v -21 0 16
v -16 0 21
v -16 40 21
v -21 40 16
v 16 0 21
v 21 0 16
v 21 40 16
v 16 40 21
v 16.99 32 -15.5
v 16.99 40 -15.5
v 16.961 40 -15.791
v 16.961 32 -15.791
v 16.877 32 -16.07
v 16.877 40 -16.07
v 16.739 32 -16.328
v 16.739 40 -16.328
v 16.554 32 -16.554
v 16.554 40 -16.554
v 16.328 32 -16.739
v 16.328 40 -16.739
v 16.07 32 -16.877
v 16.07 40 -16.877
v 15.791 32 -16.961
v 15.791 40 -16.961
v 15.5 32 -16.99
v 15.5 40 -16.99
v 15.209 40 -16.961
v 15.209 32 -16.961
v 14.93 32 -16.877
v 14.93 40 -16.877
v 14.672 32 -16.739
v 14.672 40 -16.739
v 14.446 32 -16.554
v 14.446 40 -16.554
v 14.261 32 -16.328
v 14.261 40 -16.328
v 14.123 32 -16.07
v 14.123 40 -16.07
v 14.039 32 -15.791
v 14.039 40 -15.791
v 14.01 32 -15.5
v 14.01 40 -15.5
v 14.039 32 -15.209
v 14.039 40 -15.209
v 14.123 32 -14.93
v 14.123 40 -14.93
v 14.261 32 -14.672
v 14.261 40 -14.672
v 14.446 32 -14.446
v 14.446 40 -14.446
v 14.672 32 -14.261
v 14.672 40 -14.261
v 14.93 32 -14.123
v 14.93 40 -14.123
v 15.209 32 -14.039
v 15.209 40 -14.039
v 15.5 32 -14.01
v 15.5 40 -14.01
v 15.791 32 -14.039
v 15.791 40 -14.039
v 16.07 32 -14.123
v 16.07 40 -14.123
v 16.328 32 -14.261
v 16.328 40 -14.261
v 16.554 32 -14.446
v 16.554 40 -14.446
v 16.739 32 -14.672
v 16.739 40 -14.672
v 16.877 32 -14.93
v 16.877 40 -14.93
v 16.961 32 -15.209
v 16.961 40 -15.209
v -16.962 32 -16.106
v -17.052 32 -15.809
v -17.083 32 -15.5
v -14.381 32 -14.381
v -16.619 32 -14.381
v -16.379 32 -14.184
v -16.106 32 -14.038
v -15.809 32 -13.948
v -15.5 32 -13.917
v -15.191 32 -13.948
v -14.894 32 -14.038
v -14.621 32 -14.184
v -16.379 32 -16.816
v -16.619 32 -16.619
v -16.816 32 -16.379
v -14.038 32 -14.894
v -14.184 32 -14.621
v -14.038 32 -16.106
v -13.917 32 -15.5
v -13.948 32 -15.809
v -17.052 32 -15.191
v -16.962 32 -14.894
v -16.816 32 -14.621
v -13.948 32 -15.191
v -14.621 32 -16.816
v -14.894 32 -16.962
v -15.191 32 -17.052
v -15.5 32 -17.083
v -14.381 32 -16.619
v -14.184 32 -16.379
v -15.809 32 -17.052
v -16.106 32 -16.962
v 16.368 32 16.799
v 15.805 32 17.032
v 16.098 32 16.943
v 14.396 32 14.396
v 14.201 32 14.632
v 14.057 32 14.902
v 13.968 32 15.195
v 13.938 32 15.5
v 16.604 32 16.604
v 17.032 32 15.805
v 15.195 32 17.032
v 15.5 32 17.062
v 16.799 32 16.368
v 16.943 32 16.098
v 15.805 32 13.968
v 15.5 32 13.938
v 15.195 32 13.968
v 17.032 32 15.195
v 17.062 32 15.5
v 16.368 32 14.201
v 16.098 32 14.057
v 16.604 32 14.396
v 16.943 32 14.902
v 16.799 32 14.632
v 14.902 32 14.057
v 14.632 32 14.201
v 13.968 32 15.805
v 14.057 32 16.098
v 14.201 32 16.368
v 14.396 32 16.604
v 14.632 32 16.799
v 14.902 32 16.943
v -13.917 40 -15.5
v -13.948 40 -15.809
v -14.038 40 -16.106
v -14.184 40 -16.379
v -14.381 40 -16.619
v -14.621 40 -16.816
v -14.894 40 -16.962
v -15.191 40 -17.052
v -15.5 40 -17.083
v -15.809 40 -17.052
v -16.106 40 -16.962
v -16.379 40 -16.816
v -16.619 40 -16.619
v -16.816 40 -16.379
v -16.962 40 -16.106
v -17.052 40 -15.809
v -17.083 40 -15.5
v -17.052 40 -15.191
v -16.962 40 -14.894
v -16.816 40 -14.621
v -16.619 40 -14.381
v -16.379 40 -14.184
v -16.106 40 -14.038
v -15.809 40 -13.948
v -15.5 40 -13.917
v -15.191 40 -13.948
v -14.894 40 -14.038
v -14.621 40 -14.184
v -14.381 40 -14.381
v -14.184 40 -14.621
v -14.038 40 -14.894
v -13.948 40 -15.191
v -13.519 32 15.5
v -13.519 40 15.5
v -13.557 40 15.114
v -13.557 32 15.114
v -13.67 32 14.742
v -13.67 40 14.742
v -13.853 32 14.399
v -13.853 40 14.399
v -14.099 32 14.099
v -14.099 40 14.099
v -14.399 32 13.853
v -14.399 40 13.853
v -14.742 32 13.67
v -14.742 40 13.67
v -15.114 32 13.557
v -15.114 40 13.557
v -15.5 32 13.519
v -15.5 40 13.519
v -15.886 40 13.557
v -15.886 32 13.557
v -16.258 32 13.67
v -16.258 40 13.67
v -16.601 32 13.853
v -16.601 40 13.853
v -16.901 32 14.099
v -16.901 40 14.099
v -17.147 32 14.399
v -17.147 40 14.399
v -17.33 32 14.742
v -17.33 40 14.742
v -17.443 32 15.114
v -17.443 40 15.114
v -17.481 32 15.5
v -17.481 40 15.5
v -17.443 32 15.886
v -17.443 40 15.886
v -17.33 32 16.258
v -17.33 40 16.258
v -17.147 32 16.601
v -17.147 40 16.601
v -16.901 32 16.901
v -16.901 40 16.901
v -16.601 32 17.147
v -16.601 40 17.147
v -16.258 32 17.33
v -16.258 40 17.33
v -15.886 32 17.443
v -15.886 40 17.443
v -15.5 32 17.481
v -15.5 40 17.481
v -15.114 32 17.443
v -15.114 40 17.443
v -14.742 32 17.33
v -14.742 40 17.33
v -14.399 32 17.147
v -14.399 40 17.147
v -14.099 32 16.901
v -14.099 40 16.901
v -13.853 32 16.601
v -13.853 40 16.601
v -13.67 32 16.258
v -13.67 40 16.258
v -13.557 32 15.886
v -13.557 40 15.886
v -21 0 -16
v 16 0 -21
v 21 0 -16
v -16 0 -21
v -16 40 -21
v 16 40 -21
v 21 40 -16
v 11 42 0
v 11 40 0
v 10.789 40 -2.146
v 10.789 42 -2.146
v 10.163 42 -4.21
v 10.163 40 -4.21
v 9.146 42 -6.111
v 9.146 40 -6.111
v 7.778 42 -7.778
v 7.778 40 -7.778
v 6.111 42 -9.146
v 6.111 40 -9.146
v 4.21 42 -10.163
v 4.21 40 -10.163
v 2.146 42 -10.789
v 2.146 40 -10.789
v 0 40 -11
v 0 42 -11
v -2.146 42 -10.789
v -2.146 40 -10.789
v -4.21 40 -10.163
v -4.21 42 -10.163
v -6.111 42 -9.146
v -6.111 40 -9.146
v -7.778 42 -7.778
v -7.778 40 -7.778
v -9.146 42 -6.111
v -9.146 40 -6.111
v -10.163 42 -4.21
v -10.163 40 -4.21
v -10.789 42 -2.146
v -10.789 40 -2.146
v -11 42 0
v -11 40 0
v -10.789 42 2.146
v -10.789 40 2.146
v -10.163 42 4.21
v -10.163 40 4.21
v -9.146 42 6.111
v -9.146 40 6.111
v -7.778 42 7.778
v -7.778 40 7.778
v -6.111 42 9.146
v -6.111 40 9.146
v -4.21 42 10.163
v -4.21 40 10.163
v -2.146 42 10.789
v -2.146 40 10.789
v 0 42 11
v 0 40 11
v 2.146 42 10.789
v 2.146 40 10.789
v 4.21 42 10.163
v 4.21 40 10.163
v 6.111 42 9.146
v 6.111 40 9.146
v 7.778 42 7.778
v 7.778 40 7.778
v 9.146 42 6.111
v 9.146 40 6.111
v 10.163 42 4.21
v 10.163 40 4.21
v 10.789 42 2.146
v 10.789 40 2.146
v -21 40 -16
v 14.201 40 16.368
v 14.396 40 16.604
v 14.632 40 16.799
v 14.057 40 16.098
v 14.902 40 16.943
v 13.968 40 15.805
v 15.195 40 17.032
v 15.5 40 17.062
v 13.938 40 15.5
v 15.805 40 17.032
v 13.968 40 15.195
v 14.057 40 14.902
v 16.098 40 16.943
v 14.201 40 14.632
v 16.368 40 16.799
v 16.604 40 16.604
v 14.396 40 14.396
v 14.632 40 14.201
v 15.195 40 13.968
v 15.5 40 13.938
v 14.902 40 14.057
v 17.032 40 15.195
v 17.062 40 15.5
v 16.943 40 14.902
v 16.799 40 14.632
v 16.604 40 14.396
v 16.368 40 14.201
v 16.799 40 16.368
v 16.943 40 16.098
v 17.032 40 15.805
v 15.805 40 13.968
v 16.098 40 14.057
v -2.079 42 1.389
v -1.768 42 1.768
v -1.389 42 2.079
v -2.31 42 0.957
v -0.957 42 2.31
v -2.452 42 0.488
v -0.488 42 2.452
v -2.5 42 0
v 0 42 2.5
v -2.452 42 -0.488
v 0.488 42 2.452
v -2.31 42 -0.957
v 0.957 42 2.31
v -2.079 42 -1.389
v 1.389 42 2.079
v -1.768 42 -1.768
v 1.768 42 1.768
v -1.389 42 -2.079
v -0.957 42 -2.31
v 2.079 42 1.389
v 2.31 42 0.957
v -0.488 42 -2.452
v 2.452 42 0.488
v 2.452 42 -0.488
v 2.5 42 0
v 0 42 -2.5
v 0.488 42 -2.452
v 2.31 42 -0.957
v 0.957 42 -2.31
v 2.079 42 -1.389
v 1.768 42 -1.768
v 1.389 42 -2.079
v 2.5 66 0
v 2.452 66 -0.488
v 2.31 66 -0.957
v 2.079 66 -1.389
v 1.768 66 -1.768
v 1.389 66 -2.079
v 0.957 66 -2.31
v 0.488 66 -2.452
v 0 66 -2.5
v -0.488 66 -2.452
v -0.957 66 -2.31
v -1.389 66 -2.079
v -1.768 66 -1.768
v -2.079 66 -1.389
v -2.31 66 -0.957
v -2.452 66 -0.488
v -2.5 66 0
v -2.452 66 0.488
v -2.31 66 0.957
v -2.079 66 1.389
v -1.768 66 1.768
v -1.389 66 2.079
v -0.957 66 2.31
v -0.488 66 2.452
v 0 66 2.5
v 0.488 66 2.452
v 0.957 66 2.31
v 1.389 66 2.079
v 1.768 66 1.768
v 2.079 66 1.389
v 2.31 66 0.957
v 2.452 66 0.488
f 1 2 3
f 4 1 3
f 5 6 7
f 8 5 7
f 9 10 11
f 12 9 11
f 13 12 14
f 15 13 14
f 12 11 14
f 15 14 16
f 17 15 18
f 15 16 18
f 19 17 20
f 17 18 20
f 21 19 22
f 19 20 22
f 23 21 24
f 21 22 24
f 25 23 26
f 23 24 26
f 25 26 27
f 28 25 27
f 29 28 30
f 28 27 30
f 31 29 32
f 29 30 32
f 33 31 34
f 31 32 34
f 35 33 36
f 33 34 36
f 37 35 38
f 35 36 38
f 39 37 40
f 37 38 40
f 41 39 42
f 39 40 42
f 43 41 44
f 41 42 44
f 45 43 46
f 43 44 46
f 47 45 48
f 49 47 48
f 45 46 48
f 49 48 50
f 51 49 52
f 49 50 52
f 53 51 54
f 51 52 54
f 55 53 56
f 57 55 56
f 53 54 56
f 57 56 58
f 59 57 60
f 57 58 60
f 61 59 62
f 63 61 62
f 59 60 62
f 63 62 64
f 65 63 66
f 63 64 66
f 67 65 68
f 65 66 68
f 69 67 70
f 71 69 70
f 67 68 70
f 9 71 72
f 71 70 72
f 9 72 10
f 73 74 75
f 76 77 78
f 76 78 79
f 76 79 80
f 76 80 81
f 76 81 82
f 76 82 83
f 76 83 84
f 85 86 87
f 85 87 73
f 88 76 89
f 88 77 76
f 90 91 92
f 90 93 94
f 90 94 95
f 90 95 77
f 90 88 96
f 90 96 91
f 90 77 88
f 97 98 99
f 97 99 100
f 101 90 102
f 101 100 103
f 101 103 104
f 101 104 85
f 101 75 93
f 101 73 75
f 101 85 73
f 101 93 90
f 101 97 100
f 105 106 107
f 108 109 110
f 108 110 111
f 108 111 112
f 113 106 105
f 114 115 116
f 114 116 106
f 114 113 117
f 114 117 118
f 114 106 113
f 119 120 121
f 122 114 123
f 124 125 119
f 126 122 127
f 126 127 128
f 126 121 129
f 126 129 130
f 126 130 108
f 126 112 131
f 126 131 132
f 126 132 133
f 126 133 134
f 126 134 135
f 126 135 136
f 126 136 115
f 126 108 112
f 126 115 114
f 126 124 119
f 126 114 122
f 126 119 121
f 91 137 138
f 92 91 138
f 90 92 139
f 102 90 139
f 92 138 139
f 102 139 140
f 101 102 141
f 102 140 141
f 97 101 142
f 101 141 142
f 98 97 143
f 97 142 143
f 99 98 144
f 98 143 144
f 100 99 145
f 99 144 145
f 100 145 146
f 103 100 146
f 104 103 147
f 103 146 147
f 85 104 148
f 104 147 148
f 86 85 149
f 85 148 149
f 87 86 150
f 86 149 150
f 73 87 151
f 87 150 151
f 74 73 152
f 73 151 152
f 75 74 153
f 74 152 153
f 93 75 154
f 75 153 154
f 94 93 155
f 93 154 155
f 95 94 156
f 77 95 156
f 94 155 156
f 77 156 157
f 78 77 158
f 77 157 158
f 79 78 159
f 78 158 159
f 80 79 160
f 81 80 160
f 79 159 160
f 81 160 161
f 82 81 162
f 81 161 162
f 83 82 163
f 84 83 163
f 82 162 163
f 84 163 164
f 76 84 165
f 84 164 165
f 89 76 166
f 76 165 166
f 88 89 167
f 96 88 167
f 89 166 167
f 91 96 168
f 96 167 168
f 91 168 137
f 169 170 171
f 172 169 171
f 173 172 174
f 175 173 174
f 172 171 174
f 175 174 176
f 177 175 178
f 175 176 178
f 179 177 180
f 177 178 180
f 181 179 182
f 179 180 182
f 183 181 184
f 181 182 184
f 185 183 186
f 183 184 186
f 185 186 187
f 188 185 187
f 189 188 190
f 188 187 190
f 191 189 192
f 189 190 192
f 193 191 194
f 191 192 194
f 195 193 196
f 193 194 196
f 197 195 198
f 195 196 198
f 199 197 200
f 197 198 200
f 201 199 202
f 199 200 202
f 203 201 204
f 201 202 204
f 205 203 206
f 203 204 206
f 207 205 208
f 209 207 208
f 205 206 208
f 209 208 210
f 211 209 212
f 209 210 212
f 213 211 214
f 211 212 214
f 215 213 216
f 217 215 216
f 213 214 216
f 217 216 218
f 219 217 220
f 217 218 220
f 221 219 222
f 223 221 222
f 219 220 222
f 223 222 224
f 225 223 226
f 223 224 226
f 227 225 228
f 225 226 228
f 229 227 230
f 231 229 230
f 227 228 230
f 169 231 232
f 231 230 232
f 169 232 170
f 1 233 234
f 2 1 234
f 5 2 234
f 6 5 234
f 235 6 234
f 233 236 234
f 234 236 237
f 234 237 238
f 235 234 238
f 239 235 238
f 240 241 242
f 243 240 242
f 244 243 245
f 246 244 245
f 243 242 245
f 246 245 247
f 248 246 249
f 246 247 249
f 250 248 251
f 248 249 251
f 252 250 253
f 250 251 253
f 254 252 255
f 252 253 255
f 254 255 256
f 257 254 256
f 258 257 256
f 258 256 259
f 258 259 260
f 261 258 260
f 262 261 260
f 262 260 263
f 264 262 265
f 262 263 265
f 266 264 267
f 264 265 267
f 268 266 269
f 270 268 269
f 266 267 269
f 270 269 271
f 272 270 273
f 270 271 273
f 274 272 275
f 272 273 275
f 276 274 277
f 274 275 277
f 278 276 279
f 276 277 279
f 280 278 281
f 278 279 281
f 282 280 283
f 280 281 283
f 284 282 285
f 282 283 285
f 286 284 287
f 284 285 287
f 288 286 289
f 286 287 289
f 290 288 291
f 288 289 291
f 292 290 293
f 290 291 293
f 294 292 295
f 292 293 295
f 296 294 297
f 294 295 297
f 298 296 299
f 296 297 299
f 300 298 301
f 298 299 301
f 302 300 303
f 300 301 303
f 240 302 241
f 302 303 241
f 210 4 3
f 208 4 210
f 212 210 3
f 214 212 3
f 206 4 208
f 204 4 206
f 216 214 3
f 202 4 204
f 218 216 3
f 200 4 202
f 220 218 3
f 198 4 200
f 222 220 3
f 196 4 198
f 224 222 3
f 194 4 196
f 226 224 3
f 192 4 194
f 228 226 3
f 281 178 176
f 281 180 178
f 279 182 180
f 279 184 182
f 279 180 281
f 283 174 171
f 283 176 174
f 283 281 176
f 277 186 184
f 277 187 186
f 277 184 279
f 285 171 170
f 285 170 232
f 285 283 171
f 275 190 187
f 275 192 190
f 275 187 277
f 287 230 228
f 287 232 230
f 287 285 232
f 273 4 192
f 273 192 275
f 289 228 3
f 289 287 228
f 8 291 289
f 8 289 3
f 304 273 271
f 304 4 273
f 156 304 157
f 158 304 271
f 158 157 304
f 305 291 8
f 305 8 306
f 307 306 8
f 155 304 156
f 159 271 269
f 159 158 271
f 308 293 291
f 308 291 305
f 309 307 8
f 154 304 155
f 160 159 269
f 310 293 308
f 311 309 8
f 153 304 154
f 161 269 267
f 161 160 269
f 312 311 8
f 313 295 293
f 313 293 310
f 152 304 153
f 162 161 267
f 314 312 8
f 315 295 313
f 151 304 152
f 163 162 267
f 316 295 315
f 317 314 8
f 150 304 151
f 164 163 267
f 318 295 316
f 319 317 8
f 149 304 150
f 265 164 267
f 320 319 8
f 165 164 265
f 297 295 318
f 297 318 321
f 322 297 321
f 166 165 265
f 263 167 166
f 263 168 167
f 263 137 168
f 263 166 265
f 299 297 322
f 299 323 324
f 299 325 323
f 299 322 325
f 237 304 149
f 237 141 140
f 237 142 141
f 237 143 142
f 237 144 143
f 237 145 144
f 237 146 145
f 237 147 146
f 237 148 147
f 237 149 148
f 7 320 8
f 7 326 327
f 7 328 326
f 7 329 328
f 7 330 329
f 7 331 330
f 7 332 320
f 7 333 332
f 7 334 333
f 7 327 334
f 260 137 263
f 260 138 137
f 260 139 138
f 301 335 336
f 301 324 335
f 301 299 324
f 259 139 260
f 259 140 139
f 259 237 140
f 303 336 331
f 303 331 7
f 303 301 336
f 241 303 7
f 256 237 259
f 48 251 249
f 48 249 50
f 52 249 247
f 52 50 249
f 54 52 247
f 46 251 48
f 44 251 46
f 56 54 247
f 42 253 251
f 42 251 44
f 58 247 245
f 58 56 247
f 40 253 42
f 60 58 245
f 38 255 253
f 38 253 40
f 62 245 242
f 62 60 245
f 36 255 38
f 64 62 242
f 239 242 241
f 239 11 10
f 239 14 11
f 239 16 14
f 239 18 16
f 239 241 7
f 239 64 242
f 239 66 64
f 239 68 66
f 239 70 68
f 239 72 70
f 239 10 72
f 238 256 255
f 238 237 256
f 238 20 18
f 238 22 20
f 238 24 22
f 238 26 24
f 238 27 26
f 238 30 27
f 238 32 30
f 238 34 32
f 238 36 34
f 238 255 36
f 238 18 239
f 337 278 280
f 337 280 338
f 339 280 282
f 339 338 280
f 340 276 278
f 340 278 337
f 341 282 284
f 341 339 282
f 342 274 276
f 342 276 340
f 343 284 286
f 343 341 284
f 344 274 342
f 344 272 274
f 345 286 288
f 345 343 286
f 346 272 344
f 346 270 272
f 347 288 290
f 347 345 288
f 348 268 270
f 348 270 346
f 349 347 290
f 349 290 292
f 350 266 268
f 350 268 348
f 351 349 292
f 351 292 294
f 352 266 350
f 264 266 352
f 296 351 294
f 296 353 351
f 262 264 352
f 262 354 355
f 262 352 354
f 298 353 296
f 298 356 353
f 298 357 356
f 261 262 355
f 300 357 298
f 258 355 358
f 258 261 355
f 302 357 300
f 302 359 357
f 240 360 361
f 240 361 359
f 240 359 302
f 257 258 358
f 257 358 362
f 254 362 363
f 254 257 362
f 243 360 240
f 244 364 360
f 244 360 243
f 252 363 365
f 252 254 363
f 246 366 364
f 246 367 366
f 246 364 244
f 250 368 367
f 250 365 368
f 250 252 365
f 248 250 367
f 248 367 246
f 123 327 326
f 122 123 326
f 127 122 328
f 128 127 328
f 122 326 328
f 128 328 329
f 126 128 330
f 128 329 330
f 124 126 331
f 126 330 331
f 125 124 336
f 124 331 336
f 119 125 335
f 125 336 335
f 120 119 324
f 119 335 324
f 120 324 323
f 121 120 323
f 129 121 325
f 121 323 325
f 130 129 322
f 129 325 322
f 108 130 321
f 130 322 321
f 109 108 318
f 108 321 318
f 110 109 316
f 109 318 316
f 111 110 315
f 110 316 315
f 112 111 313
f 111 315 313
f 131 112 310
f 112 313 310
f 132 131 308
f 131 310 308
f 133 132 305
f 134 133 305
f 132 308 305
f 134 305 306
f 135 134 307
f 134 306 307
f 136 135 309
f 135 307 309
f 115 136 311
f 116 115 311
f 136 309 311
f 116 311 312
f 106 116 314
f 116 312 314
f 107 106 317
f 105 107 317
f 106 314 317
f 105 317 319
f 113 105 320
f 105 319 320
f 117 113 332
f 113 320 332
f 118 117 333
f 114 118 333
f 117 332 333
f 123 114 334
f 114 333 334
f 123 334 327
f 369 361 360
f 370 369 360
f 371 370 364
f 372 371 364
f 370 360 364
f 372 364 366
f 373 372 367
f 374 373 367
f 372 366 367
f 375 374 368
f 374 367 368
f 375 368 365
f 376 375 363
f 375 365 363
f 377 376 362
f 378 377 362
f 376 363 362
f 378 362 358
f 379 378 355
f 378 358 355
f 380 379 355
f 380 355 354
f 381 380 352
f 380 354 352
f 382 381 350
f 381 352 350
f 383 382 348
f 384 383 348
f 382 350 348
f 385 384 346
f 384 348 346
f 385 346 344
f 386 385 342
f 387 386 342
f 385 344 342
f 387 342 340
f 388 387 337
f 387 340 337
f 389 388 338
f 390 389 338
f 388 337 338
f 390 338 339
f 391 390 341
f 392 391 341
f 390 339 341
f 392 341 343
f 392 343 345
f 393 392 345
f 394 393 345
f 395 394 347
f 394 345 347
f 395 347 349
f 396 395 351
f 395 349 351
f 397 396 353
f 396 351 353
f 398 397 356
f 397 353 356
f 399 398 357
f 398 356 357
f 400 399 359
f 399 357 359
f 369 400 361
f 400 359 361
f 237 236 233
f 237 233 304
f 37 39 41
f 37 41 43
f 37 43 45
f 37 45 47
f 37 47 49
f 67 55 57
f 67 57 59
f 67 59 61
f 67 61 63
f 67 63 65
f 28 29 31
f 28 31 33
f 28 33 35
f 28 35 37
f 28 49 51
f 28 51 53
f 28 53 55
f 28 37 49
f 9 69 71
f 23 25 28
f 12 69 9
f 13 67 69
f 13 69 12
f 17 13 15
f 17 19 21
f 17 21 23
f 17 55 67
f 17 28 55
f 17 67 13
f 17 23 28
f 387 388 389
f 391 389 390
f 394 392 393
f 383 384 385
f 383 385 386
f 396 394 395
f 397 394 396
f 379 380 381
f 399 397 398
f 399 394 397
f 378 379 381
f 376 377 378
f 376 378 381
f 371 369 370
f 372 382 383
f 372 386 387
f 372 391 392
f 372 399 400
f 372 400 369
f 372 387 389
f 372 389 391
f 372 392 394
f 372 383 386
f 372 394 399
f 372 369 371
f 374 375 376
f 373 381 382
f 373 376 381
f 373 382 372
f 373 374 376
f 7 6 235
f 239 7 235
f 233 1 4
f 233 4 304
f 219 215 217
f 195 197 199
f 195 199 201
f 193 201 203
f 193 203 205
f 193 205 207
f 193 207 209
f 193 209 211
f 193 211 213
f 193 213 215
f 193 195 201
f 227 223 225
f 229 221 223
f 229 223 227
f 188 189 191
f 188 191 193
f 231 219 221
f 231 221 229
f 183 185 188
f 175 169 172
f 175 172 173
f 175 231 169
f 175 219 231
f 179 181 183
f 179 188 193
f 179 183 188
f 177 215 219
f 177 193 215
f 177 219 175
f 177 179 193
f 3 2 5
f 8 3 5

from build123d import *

# Parameters (mm, degrees)
SKETCH1_W           = 42
SKETCH1_H           = 42
BOSS_EXTRUDE1_DEPTH = 40
CHAMFER1_SIZE       = 5
SKETCH2_R           = 11
BOSS_EXTRUDE2_DEPTH = 2
SKETCH3_R           = 1.490042647
SKETCH3_R_2         = 1.56185503
SKETCH3_R_3         = 1.981129843
SKETCH3_R_4         = 1.582833873
CUT_EXTRUDE1_DEPTH  = 8
SKETCH4_R           = 2.5
BOSS_EXTRUDE3_DEPTH = 24


with BuildPart() as part:
    # Sketch1 → Boss-Extrude1 (new body)
    with BuildSketch(Plane(origin=(0, 0, 0), x_dir=(1, 0, 0), z_dir=(0, 1, 0))):
        Rectangle(SKETCH1_W, SKETCH1_H)
    extrude(amount=BOSS_EXTRUDE1_DEPTH)

    # Chamfer1
    chamfer1_edges = [part.edges().sort_by_distance(p)[0] for p in [
        (-21, 20, -21),
        (21, 20, -21),
        (21, 20, 21),
        (-21, 20, 21),
    ]]
    chamfer(chamfer1_edges, length=CHAMFER1_SIZE)

    # Sketch2 → Boss-Extrude2 (add)
    with BuildSketch(Plane(origin=(0, 40, 0), x_dir=(1, 0, 0), z_dir=(0, 1, 0))):
        Circle(SKETCH2_R)
    extrude(amount=BOSS_EXTRUDE2_DEPTH)

    # Sketch3 → Cut-Extrude1 (cut)
    with BuildSketch(Plane(origin=(0, 40, 0), x_dir=(1, 0, 0), z_dir=(0, 1, 0))):
        with Locations((15.5, 15.5)):
            Circle(SKETCH3_R)
        with Locations((15.5, -15.5)):
            Circle(SKETCH3_R_2)
        with Locations((-15.5, -15.5)):
            Circle(SKETCH3_R_3)
        with Locations((-15.5, 15.5)):
            Circle(SKETCH3_R_4)
    extrude(amount=-CUT_EXTRUDE1_DEPTH, mode=Mode.SUBTRACT)

    # Sketch4 → Boss-Extrude3 (add)
    with BuildSketch(Plane(origin=(0, 42, 0), x_dir=(1, 0, 0), z_dir=(0, 1, 0))):
        Circle(SKETCH4_R)
    extrude(amount=BOSS_EXTRUDE3_DEPTH)


solid = part.part
